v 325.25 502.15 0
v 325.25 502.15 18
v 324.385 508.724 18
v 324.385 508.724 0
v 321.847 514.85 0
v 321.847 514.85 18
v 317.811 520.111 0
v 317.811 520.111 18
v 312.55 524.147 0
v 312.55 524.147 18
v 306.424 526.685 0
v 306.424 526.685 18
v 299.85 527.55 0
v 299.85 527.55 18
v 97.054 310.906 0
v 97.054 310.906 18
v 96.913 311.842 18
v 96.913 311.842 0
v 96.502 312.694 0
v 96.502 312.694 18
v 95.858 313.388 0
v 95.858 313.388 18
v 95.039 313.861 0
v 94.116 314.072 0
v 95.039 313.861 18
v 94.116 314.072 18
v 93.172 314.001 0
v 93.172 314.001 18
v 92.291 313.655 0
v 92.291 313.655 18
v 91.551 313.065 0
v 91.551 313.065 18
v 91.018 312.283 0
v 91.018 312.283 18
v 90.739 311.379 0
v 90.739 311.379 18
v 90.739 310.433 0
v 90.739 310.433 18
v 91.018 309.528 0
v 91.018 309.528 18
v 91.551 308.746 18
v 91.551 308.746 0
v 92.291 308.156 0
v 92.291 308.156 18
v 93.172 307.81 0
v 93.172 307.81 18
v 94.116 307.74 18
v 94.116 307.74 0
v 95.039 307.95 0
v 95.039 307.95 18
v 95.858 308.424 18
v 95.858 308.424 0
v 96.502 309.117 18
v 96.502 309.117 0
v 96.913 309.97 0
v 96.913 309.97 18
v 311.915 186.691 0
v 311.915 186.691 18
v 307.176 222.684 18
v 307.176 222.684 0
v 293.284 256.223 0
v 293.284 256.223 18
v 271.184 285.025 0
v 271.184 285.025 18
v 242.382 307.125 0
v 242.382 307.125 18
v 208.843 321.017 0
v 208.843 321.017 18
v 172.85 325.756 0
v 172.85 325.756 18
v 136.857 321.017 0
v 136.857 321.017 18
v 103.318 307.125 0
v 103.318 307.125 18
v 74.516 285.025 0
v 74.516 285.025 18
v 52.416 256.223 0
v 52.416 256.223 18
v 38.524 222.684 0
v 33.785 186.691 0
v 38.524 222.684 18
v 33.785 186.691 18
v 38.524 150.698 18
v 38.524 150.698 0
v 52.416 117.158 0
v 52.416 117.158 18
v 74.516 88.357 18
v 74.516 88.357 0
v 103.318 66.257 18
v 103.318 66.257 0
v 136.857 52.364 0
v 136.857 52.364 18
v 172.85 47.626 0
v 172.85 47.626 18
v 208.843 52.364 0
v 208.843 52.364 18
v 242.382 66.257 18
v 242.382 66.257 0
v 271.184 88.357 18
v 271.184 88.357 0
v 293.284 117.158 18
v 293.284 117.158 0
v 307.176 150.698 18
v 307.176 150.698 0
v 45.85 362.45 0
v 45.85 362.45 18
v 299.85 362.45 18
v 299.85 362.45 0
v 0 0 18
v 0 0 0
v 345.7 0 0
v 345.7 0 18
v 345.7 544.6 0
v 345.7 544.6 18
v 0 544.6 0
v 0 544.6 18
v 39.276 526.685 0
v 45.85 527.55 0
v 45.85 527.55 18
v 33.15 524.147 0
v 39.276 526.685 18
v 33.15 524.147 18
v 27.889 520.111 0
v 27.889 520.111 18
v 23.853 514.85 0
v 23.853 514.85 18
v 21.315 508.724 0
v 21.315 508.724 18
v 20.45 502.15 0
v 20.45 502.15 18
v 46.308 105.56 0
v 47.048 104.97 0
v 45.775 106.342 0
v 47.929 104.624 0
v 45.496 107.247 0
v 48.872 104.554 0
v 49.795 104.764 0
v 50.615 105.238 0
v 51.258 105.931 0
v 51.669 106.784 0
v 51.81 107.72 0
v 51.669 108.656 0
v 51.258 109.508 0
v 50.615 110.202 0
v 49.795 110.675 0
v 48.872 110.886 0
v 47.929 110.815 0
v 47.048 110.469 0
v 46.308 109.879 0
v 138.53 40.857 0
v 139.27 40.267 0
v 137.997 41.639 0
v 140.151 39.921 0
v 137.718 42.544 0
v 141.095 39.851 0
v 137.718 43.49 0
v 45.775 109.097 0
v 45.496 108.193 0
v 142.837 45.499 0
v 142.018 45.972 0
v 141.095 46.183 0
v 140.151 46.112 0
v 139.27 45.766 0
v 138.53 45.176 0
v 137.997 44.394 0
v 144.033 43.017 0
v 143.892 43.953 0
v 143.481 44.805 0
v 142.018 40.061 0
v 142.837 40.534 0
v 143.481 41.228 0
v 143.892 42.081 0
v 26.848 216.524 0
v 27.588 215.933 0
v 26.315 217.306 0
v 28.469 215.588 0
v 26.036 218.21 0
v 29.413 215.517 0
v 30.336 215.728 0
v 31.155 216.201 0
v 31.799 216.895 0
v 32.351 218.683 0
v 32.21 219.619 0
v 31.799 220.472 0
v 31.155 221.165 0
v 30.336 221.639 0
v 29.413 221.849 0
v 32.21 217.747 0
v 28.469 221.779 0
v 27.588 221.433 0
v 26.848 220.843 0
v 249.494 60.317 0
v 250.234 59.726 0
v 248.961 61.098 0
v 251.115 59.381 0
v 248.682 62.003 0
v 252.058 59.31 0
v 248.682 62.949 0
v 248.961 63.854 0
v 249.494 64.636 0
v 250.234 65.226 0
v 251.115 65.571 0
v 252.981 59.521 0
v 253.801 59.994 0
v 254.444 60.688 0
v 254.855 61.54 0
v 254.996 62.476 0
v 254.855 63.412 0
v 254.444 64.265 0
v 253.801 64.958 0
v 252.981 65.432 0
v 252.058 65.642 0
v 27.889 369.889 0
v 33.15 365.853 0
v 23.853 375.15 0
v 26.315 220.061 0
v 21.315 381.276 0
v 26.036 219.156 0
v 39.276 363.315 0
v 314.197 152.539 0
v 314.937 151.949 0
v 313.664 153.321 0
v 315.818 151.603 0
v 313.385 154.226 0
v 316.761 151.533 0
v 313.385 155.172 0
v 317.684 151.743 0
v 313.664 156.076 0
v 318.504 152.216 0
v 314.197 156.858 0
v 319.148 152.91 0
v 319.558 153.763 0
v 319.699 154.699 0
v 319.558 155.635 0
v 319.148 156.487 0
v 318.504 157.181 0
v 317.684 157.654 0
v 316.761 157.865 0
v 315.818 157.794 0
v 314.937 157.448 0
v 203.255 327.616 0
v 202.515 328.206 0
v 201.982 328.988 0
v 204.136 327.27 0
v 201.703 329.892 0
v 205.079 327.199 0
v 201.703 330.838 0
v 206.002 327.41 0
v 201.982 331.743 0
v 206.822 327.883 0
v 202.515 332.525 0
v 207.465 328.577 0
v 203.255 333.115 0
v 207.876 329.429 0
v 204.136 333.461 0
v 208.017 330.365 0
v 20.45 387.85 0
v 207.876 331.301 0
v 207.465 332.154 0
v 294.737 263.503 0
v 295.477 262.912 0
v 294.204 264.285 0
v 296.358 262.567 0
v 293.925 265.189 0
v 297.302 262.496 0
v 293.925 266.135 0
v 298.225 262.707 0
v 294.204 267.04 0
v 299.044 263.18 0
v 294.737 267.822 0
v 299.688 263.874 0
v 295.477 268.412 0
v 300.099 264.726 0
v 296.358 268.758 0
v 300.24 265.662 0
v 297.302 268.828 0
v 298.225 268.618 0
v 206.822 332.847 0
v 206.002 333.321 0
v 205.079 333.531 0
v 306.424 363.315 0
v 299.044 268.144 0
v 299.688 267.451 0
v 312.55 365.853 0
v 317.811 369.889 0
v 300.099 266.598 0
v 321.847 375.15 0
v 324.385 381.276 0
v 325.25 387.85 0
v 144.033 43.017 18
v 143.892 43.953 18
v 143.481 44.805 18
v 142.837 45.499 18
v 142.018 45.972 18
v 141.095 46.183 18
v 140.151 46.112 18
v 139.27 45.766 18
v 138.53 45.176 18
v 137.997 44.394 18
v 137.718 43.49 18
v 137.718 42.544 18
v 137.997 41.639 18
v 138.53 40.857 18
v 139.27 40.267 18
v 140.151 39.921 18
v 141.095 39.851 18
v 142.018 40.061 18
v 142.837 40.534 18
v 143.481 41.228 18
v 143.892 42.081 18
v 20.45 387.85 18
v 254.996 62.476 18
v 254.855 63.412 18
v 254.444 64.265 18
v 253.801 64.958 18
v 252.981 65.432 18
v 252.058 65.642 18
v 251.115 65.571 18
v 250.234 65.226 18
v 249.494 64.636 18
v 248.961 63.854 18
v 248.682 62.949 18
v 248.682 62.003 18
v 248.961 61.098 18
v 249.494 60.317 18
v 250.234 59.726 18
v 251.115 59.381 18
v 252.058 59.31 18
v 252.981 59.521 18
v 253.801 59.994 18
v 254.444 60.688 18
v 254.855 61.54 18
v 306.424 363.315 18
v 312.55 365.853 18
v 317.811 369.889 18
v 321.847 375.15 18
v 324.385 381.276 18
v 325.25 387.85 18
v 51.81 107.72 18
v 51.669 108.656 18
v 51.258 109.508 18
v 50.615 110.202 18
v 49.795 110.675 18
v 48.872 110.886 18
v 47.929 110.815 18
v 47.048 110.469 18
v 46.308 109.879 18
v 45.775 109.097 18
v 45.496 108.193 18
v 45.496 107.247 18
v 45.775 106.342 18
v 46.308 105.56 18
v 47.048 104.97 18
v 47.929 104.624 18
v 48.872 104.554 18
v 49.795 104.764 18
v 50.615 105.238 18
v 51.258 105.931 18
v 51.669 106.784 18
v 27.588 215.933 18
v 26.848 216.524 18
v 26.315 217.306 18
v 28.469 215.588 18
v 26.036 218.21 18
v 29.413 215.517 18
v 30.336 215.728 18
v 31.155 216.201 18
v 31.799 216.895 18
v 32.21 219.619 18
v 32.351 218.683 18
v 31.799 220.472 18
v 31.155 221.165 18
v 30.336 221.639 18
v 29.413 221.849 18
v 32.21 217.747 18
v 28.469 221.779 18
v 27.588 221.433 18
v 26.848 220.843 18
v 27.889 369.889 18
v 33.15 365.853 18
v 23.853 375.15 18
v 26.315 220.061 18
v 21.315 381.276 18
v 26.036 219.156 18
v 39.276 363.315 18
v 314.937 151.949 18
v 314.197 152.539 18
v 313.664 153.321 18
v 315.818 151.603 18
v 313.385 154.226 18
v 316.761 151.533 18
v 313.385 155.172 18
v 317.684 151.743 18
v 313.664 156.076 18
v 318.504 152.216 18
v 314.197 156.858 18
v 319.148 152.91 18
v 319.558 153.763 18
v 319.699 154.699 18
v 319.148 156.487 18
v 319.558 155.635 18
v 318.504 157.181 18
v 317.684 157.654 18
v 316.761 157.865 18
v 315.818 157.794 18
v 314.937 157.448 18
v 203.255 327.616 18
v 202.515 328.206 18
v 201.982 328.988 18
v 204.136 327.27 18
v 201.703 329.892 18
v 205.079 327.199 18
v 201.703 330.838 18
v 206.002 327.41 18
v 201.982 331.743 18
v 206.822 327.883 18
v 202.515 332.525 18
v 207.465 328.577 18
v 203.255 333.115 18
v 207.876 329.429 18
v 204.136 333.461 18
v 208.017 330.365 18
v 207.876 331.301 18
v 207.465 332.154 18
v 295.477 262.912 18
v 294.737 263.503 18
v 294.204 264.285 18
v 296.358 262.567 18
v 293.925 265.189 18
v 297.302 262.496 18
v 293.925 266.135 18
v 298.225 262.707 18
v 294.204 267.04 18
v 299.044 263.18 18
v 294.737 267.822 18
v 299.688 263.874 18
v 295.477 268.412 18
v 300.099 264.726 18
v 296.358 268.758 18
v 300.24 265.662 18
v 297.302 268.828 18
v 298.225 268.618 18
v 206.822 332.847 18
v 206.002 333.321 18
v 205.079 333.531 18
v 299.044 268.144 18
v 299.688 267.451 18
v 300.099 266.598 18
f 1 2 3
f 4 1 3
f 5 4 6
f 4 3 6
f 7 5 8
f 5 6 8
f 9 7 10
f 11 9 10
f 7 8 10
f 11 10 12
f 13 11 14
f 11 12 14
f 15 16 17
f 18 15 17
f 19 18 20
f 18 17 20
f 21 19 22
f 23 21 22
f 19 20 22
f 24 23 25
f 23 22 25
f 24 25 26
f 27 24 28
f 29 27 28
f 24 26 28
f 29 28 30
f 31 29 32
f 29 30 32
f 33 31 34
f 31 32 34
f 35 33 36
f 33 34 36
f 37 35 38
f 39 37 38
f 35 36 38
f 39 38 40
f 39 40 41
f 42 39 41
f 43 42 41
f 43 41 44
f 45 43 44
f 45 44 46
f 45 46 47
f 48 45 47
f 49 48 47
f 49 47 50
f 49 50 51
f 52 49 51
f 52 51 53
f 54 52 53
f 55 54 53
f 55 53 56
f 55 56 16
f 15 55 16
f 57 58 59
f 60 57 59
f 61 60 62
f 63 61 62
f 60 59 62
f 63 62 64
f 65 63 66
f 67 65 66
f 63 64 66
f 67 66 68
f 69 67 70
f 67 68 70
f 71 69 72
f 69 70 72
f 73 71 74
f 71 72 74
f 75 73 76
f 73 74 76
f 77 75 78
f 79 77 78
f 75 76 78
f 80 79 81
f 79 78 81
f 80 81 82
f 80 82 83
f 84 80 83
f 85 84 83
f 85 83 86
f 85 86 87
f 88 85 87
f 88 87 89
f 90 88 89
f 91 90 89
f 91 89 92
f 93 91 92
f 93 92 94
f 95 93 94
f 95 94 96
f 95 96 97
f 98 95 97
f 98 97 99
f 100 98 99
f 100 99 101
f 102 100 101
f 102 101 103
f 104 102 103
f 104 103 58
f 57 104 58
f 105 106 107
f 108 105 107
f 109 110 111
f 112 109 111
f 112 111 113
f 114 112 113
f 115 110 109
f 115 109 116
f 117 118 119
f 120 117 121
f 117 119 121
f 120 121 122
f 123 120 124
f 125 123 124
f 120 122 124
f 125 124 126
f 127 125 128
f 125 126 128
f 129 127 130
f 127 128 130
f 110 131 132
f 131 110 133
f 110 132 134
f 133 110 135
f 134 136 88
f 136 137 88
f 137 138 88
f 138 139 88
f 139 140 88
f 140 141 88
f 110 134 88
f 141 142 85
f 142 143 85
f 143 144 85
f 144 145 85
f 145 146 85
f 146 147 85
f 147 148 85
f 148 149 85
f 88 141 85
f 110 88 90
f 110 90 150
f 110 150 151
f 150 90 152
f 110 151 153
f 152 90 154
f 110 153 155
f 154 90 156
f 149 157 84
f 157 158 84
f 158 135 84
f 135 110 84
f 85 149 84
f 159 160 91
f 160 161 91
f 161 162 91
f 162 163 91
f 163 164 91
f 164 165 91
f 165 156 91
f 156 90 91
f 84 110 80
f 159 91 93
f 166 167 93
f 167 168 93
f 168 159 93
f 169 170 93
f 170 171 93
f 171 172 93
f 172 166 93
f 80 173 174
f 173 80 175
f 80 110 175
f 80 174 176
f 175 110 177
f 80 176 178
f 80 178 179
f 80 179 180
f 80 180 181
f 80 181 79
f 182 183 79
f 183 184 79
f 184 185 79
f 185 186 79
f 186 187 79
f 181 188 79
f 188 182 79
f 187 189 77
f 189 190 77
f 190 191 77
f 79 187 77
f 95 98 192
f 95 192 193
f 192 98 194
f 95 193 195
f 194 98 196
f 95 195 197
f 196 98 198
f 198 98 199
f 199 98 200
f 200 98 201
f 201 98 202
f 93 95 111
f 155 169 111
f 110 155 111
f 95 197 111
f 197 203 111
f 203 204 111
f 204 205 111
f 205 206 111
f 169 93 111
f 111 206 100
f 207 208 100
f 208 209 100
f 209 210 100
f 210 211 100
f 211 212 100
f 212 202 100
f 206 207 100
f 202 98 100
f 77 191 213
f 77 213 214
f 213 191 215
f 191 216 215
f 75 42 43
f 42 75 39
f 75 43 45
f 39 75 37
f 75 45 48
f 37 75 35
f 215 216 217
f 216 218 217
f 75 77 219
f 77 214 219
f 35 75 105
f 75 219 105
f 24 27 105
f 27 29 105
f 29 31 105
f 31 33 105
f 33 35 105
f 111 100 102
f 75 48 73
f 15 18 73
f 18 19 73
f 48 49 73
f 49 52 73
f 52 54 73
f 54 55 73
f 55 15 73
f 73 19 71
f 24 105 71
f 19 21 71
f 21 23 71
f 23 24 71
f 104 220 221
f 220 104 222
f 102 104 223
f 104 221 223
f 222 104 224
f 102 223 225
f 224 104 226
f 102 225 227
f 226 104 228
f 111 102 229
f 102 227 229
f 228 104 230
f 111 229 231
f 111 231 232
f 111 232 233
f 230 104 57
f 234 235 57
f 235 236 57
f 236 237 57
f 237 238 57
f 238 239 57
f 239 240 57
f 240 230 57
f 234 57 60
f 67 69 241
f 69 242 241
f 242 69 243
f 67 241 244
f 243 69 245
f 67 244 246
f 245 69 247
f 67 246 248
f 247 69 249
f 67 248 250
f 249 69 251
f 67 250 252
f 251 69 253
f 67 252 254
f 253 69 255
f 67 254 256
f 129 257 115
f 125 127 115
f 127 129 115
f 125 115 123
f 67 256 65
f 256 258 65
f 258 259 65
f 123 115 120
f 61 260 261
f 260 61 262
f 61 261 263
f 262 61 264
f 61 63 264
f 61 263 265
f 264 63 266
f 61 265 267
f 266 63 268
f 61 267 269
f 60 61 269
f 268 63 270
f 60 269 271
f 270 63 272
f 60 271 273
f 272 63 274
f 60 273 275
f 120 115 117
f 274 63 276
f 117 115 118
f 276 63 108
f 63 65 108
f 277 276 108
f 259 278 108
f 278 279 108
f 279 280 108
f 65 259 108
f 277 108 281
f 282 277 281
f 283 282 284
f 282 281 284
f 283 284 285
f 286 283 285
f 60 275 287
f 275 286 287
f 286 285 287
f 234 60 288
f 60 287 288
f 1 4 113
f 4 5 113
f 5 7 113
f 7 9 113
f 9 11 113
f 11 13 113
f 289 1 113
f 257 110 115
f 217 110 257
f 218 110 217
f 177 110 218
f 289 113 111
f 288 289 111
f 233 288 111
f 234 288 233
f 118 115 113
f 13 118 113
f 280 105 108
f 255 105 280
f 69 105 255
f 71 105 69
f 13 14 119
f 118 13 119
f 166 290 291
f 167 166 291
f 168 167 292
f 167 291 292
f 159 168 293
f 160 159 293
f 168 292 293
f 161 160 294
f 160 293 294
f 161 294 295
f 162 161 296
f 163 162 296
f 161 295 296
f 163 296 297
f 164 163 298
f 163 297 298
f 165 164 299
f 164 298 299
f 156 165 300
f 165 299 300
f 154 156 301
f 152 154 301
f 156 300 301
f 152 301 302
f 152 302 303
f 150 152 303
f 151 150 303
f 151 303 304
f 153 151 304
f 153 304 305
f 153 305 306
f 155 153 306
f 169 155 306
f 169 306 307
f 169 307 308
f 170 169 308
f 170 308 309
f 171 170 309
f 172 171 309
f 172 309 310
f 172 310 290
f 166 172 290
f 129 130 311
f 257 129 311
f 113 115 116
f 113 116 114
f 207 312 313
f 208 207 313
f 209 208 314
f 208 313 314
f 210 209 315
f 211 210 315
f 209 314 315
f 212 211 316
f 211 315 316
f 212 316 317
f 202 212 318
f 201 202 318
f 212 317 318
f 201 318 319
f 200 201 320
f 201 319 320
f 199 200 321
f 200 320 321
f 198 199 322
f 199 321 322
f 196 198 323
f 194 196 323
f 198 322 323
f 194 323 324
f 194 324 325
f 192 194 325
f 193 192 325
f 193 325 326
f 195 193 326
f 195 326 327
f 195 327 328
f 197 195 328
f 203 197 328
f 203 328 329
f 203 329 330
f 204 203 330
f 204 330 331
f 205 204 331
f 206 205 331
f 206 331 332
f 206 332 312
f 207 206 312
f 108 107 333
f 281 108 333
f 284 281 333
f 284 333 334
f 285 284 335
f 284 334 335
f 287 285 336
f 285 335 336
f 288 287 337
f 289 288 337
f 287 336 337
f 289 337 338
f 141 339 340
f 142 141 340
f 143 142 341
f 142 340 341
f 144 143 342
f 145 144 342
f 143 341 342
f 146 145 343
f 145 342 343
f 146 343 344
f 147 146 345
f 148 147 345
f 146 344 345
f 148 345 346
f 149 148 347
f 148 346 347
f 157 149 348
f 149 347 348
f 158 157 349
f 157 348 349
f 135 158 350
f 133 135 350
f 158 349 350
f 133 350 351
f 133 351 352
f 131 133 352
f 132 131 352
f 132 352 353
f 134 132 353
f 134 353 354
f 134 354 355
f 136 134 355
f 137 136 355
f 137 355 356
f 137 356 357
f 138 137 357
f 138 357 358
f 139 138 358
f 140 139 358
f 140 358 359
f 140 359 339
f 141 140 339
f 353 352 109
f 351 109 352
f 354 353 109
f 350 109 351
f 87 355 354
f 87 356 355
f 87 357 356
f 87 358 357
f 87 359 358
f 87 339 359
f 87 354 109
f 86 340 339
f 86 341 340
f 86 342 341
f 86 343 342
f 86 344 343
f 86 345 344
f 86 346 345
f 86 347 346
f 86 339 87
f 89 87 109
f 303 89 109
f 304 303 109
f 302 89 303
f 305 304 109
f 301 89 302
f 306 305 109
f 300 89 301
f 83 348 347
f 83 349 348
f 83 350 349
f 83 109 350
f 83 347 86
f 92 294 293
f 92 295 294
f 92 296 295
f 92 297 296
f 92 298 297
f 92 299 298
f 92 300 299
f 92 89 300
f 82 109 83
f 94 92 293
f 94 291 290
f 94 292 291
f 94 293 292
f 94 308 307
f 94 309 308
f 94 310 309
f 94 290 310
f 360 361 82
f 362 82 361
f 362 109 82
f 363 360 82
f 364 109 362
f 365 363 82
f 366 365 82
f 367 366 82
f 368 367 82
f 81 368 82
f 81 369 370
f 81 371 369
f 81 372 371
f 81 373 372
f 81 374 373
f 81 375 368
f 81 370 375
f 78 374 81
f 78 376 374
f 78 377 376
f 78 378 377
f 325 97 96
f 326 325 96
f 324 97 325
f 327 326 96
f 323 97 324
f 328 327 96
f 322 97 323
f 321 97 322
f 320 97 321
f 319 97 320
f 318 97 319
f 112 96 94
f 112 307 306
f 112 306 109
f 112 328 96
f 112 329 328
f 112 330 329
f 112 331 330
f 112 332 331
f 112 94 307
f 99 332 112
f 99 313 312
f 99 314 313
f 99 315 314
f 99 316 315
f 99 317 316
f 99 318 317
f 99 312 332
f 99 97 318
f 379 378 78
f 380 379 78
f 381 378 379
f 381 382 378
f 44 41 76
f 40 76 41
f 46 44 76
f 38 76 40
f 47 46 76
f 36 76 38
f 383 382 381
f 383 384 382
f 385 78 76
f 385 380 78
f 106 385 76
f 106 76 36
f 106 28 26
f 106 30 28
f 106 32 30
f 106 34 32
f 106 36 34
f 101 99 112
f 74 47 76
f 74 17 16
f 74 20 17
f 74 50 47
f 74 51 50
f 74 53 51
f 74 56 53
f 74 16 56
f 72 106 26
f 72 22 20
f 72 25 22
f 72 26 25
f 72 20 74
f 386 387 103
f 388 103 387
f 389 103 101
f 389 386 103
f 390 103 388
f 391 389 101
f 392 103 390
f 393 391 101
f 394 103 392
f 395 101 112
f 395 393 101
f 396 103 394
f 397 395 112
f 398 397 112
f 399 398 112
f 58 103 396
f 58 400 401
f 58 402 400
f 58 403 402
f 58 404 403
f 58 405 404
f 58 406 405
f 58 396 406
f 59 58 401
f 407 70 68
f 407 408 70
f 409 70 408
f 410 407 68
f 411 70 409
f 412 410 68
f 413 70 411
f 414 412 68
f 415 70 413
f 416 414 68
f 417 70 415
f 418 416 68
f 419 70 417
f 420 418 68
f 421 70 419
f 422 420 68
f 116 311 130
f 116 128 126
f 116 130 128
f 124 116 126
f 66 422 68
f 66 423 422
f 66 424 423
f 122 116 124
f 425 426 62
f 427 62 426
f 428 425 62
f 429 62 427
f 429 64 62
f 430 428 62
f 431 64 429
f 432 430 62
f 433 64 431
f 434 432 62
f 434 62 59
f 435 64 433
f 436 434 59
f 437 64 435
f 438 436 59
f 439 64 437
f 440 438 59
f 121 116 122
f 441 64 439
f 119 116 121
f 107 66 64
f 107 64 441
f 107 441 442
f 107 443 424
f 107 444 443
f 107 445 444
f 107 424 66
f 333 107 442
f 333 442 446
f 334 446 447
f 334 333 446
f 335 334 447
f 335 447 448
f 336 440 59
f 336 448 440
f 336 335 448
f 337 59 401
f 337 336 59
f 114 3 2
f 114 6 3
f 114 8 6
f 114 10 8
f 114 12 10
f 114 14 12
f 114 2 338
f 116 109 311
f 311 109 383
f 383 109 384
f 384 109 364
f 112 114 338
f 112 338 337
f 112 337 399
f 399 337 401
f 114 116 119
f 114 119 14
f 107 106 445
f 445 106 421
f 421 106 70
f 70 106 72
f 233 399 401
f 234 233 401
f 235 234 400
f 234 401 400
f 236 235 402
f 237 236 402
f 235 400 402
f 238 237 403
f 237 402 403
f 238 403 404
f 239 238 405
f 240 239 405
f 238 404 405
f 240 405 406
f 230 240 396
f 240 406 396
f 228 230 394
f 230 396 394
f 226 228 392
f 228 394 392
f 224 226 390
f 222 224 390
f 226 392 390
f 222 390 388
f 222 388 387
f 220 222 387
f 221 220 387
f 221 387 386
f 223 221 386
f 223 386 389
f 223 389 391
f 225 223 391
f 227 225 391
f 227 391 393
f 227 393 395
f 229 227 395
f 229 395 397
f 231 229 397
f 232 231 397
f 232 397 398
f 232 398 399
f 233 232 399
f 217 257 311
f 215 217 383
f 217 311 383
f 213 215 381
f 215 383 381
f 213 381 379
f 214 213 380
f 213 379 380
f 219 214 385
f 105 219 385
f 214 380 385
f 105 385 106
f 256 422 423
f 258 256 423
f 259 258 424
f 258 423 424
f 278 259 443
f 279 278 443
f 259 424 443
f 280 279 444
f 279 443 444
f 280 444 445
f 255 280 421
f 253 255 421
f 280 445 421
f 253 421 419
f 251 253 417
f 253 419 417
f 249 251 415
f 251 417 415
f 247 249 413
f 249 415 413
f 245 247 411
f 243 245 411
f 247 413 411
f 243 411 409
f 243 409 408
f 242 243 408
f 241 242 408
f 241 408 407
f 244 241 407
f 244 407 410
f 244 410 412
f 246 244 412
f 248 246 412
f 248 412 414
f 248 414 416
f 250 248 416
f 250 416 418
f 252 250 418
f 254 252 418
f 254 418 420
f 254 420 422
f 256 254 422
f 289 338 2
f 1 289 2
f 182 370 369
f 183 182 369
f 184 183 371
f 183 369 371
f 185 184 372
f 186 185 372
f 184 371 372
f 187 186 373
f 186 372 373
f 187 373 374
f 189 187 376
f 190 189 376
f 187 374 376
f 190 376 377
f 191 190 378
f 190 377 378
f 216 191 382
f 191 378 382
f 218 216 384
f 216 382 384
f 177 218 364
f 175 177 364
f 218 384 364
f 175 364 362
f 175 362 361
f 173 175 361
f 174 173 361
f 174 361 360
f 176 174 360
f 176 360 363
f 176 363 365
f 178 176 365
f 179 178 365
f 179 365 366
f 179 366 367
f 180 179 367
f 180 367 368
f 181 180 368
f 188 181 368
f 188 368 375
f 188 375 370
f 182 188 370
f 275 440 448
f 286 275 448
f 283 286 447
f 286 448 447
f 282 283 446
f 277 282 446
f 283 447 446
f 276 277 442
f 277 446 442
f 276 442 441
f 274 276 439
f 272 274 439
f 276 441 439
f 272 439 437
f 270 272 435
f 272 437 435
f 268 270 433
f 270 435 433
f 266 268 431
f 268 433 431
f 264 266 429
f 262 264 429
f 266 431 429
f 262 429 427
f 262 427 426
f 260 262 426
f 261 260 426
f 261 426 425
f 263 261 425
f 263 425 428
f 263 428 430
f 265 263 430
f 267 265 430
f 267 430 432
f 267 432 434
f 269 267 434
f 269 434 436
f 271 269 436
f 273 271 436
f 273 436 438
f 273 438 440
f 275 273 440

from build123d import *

# Parameters (mm, degrees)
SKETCH1_W           = 345.7
SKETCH1_H           = 544.6
BOSS_EXTRUDE1_DEPTH = 18
SKETCH2_W           = 266.7
SKETCH2_H           = 127
CUT_EXTRUDE1_DEPTH  = 19
SKETCH3_R           = 139.065
CUT_EXTRUDE2_DEPTH  = 19
SKETCH4_R           = 3.175
CUT_EXTRUDE3_DEPTH  = 19
CUT_EXTRUDE4_DEPTH  = 19


with BuildPart() as part:
    # Sketch1 → Boss-Extrude1 (new body)
    with BuildSketch(Plane.XY):
        with Locations((172.85, 272.3)):
            Rectangle(SKETCH1_W, SKETCH1_H)
    extrude(amount=BOSS_EXTRUDE1_DEPTH)

    # Sketch2 → Cut-Extrude1 (cut, through all)
    with BuildSketch(Plane.XY.offset(18)):
        with Locations((172.85, 445)):
            Rectangle(SKETCH2_W, SKETCH2_H)
    extrude(amount=-CUT_EXTRUDE1_DEPTH, mode=Mode.SUBTRACT)

    # Sketch3 → Cut-Extrude2 (cut, through all)
    with BuildSketch(Plane.XY.offset(18)):
        with Locations((172.85, 186.690965799)):
            Circle(SKETCH3_R)
    extrude(amount=-CUT_EXTRUDE2_DEPTH, mode=Mode.SUBTRACT)

    # Sketch4 → Cut-Extrude3 (cut, through all)
    with BuildSketch(Plane.XY.offset(18)):
        with Locations((204.842157428, 330.365184475)):
            Circle(SKETCH4_R)
        with Locations((297.06488577, 265.662108644)):
            Circle(SKETCH4_R)
        with Locations((316.524218676, 154.698808371)):
            Circle(SKETCH4_R)
        with Locations((251.821142845, 62.476080029)):
            Circle(SKETCH4_R)
        with Locations((140.857842572, 43.016747123)):
            Circle(SKETCH4_R)
        with Locations((48.63511423, 107.719822954)):
            Circle(SKETCH4_R)
        with Locations((29.175781324, 218.683123227)):
            Circle(SKETCH4_R)
        with Locations((93.878857155, 310.905851569)):
            Circle(SKETCH4_R)
    extrude(amount=-CUT_EXTRUDE3_DEPTH, mode=Mode.SUBTRACT)

    # Sketch6 → Cut-Extrude4 (cut, through all)
    with BuildSketch(Plane.XY.offset(18)):
        with BuildLine():
            Line((45.85, 362.45), (299.85, 362.45))
            ThreePointArc((299.85, 362.45), (317.810512242, 369.889487758), (325.25, 387.85))
            Line((325.25, 387.85), (325.25, 502.15))
            ThreePointArc((325.25, 502.15), (317.810512242, 520.110512242), (299.85, 527.55))
            Line((299.85, 527.55), (45.85, 527.55))
            ThreePointArc((45.85, 527.55), (27.889487758, 520.110512242), (20.45, 502.15))
            Line((20.45, 502.15), (20.45, 387.85))
            ThreePointArc((20.45, 387.85), (27.889487758, 369.889487758), (45.85, 362.45))
        make_face()
    extrude(amount=-CUT_EXTRUDE4_DEPTH, mode=Mode.SUBTRACT)


solid = part.part
